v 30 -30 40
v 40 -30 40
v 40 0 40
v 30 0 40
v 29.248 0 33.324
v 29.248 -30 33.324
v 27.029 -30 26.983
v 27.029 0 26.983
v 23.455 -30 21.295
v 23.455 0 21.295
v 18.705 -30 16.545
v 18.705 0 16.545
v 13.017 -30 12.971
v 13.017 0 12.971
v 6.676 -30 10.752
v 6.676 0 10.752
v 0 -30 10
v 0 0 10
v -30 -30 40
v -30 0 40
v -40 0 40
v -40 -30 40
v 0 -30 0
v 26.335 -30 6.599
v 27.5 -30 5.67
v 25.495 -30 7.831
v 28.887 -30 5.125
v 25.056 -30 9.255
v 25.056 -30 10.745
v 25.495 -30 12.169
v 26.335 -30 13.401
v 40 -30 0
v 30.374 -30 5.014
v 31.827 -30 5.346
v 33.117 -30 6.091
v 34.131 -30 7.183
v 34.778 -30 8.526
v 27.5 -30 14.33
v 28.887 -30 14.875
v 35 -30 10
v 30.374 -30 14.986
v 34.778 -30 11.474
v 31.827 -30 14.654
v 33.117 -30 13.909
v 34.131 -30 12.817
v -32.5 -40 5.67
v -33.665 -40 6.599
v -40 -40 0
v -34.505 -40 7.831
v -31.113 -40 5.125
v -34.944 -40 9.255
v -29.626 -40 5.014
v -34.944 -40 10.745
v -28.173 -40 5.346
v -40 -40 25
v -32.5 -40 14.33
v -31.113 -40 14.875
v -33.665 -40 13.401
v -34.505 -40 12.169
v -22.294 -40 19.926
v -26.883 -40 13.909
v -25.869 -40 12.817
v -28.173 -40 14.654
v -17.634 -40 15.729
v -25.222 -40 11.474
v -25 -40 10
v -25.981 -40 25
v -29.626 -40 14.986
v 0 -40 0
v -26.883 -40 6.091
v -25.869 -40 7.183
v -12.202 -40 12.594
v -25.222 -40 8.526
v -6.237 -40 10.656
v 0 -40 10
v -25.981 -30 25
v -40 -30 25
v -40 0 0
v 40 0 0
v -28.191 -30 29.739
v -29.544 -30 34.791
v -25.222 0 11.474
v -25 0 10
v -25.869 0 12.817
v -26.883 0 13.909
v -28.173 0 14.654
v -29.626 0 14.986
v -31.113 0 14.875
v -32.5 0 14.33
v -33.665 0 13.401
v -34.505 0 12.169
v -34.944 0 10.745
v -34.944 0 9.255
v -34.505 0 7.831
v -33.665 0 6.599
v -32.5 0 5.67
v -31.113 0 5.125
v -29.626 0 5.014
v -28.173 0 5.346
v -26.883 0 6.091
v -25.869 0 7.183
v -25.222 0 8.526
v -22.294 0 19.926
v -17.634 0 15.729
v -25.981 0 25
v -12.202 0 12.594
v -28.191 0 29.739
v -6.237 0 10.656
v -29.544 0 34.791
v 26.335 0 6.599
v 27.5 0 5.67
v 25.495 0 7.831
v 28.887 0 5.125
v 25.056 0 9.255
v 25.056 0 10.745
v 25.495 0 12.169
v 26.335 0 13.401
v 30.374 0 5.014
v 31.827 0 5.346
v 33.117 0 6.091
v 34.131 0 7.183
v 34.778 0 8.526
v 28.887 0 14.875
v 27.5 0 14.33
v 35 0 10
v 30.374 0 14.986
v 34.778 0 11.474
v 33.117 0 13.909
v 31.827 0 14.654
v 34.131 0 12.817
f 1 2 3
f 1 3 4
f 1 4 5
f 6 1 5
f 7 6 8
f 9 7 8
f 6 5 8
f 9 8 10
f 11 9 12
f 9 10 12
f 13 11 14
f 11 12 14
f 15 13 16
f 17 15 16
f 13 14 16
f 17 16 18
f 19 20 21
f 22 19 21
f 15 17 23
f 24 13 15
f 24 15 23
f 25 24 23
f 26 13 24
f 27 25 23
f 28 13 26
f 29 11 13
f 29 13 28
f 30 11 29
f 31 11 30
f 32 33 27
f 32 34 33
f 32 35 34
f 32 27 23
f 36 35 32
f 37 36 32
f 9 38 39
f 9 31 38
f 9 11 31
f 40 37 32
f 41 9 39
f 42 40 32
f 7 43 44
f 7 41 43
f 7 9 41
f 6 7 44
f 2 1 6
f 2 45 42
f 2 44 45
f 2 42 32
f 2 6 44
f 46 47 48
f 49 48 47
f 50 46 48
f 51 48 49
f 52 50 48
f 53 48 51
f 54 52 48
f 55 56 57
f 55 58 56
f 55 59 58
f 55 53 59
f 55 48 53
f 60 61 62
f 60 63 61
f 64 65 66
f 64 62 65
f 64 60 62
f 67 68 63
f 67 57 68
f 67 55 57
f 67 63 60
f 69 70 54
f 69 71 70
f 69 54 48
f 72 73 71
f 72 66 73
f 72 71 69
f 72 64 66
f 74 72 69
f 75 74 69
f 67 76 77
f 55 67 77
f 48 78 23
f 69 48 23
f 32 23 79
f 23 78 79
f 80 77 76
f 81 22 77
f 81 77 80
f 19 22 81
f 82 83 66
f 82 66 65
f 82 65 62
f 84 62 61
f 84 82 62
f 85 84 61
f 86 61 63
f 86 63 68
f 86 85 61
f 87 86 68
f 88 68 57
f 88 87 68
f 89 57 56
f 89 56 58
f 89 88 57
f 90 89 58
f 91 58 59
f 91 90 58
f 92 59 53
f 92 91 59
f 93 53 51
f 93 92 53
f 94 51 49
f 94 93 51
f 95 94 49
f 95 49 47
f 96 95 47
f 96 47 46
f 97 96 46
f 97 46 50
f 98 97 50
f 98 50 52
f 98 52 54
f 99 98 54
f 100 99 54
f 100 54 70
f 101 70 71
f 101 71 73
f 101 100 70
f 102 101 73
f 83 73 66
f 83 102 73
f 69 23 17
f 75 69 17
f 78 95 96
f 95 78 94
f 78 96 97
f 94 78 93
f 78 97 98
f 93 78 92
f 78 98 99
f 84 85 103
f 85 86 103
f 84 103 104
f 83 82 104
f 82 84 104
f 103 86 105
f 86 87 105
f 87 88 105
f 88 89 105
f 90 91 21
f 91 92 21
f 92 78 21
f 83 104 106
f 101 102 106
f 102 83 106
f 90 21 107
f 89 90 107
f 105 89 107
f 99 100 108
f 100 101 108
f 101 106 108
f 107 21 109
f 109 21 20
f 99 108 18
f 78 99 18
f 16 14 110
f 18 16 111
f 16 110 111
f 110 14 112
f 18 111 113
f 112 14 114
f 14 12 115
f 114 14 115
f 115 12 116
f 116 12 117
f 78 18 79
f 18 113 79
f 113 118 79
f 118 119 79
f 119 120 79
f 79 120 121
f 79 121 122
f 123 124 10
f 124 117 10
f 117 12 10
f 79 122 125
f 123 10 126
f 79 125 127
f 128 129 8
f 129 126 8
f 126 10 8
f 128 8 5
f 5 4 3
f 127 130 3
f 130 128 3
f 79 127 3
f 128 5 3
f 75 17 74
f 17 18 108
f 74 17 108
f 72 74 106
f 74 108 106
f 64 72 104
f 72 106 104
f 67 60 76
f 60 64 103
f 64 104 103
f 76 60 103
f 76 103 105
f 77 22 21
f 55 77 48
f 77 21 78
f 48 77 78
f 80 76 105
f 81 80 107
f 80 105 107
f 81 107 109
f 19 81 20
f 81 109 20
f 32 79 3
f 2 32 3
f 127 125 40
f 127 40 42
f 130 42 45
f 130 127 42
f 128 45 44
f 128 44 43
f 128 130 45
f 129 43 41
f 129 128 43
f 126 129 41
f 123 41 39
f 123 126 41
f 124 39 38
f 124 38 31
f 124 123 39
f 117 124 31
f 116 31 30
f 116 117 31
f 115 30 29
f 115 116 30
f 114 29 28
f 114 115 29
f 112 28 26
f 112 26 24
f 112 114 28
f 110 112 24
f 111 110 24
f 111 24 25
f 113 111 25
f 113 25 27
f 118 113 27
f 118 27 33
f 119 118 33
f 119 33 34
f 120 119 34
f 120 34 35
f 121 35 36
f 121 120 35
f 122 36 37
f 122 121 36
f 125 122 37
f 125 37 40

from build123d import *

# Parameters (mm, degrees)
F0_R     = 5
F1_DEPTH = 30
F2_DEPTH = 40


with BuildPart() as f1:
    # F0 (on Front) → F1 (new body)
    with BuildSketch(Plane.XZ):
        with BuildLine():
            Line((-40, 25), (-25.980762, 25))
            ThreePointArc((-25.980762, 25), (-28.977775, 32.235429), (-30, 40))
            Line((-30, 40), (-40, 40))
            Line((-40, 40), (-40, 25))
        make_face()
        with BuildLine():
            ThreePointArc((30, 40), (21.213203, 18.786797), (0, 10))
            Line((0, 10), (0, 0))
            Line((0, 0), (40, 0))
            Line((40, 0), (40, 40))
            Line((40, 40), (30, 40))
        make_face()
        with Locations((30, 10)):
            Circle(F0_R, mode=Mode.SUBTRACT)
    extrude(amount=F1_DEPTH)

    # F0 (on Front) → F2 (join)
    with BuildSketch(Plane.XZ):
        with BuildLine():
            Line((0, 0), (0, 10))
            ThreePointArc((0, 10), (-15, 14.019238), (-25.980762, 25))
            Line((-25.980762, 25), (-40, 25))
            Line((-40, 25), (-40, 0))
            Line((-40, 0), (0, 0))
        make_face()
        with Locations((-30, 10)):
            Circle(F0_R, mode=Mode.SUBTRACT)
    extrude(amount=F2_DEPTH)


solid = f1.part
